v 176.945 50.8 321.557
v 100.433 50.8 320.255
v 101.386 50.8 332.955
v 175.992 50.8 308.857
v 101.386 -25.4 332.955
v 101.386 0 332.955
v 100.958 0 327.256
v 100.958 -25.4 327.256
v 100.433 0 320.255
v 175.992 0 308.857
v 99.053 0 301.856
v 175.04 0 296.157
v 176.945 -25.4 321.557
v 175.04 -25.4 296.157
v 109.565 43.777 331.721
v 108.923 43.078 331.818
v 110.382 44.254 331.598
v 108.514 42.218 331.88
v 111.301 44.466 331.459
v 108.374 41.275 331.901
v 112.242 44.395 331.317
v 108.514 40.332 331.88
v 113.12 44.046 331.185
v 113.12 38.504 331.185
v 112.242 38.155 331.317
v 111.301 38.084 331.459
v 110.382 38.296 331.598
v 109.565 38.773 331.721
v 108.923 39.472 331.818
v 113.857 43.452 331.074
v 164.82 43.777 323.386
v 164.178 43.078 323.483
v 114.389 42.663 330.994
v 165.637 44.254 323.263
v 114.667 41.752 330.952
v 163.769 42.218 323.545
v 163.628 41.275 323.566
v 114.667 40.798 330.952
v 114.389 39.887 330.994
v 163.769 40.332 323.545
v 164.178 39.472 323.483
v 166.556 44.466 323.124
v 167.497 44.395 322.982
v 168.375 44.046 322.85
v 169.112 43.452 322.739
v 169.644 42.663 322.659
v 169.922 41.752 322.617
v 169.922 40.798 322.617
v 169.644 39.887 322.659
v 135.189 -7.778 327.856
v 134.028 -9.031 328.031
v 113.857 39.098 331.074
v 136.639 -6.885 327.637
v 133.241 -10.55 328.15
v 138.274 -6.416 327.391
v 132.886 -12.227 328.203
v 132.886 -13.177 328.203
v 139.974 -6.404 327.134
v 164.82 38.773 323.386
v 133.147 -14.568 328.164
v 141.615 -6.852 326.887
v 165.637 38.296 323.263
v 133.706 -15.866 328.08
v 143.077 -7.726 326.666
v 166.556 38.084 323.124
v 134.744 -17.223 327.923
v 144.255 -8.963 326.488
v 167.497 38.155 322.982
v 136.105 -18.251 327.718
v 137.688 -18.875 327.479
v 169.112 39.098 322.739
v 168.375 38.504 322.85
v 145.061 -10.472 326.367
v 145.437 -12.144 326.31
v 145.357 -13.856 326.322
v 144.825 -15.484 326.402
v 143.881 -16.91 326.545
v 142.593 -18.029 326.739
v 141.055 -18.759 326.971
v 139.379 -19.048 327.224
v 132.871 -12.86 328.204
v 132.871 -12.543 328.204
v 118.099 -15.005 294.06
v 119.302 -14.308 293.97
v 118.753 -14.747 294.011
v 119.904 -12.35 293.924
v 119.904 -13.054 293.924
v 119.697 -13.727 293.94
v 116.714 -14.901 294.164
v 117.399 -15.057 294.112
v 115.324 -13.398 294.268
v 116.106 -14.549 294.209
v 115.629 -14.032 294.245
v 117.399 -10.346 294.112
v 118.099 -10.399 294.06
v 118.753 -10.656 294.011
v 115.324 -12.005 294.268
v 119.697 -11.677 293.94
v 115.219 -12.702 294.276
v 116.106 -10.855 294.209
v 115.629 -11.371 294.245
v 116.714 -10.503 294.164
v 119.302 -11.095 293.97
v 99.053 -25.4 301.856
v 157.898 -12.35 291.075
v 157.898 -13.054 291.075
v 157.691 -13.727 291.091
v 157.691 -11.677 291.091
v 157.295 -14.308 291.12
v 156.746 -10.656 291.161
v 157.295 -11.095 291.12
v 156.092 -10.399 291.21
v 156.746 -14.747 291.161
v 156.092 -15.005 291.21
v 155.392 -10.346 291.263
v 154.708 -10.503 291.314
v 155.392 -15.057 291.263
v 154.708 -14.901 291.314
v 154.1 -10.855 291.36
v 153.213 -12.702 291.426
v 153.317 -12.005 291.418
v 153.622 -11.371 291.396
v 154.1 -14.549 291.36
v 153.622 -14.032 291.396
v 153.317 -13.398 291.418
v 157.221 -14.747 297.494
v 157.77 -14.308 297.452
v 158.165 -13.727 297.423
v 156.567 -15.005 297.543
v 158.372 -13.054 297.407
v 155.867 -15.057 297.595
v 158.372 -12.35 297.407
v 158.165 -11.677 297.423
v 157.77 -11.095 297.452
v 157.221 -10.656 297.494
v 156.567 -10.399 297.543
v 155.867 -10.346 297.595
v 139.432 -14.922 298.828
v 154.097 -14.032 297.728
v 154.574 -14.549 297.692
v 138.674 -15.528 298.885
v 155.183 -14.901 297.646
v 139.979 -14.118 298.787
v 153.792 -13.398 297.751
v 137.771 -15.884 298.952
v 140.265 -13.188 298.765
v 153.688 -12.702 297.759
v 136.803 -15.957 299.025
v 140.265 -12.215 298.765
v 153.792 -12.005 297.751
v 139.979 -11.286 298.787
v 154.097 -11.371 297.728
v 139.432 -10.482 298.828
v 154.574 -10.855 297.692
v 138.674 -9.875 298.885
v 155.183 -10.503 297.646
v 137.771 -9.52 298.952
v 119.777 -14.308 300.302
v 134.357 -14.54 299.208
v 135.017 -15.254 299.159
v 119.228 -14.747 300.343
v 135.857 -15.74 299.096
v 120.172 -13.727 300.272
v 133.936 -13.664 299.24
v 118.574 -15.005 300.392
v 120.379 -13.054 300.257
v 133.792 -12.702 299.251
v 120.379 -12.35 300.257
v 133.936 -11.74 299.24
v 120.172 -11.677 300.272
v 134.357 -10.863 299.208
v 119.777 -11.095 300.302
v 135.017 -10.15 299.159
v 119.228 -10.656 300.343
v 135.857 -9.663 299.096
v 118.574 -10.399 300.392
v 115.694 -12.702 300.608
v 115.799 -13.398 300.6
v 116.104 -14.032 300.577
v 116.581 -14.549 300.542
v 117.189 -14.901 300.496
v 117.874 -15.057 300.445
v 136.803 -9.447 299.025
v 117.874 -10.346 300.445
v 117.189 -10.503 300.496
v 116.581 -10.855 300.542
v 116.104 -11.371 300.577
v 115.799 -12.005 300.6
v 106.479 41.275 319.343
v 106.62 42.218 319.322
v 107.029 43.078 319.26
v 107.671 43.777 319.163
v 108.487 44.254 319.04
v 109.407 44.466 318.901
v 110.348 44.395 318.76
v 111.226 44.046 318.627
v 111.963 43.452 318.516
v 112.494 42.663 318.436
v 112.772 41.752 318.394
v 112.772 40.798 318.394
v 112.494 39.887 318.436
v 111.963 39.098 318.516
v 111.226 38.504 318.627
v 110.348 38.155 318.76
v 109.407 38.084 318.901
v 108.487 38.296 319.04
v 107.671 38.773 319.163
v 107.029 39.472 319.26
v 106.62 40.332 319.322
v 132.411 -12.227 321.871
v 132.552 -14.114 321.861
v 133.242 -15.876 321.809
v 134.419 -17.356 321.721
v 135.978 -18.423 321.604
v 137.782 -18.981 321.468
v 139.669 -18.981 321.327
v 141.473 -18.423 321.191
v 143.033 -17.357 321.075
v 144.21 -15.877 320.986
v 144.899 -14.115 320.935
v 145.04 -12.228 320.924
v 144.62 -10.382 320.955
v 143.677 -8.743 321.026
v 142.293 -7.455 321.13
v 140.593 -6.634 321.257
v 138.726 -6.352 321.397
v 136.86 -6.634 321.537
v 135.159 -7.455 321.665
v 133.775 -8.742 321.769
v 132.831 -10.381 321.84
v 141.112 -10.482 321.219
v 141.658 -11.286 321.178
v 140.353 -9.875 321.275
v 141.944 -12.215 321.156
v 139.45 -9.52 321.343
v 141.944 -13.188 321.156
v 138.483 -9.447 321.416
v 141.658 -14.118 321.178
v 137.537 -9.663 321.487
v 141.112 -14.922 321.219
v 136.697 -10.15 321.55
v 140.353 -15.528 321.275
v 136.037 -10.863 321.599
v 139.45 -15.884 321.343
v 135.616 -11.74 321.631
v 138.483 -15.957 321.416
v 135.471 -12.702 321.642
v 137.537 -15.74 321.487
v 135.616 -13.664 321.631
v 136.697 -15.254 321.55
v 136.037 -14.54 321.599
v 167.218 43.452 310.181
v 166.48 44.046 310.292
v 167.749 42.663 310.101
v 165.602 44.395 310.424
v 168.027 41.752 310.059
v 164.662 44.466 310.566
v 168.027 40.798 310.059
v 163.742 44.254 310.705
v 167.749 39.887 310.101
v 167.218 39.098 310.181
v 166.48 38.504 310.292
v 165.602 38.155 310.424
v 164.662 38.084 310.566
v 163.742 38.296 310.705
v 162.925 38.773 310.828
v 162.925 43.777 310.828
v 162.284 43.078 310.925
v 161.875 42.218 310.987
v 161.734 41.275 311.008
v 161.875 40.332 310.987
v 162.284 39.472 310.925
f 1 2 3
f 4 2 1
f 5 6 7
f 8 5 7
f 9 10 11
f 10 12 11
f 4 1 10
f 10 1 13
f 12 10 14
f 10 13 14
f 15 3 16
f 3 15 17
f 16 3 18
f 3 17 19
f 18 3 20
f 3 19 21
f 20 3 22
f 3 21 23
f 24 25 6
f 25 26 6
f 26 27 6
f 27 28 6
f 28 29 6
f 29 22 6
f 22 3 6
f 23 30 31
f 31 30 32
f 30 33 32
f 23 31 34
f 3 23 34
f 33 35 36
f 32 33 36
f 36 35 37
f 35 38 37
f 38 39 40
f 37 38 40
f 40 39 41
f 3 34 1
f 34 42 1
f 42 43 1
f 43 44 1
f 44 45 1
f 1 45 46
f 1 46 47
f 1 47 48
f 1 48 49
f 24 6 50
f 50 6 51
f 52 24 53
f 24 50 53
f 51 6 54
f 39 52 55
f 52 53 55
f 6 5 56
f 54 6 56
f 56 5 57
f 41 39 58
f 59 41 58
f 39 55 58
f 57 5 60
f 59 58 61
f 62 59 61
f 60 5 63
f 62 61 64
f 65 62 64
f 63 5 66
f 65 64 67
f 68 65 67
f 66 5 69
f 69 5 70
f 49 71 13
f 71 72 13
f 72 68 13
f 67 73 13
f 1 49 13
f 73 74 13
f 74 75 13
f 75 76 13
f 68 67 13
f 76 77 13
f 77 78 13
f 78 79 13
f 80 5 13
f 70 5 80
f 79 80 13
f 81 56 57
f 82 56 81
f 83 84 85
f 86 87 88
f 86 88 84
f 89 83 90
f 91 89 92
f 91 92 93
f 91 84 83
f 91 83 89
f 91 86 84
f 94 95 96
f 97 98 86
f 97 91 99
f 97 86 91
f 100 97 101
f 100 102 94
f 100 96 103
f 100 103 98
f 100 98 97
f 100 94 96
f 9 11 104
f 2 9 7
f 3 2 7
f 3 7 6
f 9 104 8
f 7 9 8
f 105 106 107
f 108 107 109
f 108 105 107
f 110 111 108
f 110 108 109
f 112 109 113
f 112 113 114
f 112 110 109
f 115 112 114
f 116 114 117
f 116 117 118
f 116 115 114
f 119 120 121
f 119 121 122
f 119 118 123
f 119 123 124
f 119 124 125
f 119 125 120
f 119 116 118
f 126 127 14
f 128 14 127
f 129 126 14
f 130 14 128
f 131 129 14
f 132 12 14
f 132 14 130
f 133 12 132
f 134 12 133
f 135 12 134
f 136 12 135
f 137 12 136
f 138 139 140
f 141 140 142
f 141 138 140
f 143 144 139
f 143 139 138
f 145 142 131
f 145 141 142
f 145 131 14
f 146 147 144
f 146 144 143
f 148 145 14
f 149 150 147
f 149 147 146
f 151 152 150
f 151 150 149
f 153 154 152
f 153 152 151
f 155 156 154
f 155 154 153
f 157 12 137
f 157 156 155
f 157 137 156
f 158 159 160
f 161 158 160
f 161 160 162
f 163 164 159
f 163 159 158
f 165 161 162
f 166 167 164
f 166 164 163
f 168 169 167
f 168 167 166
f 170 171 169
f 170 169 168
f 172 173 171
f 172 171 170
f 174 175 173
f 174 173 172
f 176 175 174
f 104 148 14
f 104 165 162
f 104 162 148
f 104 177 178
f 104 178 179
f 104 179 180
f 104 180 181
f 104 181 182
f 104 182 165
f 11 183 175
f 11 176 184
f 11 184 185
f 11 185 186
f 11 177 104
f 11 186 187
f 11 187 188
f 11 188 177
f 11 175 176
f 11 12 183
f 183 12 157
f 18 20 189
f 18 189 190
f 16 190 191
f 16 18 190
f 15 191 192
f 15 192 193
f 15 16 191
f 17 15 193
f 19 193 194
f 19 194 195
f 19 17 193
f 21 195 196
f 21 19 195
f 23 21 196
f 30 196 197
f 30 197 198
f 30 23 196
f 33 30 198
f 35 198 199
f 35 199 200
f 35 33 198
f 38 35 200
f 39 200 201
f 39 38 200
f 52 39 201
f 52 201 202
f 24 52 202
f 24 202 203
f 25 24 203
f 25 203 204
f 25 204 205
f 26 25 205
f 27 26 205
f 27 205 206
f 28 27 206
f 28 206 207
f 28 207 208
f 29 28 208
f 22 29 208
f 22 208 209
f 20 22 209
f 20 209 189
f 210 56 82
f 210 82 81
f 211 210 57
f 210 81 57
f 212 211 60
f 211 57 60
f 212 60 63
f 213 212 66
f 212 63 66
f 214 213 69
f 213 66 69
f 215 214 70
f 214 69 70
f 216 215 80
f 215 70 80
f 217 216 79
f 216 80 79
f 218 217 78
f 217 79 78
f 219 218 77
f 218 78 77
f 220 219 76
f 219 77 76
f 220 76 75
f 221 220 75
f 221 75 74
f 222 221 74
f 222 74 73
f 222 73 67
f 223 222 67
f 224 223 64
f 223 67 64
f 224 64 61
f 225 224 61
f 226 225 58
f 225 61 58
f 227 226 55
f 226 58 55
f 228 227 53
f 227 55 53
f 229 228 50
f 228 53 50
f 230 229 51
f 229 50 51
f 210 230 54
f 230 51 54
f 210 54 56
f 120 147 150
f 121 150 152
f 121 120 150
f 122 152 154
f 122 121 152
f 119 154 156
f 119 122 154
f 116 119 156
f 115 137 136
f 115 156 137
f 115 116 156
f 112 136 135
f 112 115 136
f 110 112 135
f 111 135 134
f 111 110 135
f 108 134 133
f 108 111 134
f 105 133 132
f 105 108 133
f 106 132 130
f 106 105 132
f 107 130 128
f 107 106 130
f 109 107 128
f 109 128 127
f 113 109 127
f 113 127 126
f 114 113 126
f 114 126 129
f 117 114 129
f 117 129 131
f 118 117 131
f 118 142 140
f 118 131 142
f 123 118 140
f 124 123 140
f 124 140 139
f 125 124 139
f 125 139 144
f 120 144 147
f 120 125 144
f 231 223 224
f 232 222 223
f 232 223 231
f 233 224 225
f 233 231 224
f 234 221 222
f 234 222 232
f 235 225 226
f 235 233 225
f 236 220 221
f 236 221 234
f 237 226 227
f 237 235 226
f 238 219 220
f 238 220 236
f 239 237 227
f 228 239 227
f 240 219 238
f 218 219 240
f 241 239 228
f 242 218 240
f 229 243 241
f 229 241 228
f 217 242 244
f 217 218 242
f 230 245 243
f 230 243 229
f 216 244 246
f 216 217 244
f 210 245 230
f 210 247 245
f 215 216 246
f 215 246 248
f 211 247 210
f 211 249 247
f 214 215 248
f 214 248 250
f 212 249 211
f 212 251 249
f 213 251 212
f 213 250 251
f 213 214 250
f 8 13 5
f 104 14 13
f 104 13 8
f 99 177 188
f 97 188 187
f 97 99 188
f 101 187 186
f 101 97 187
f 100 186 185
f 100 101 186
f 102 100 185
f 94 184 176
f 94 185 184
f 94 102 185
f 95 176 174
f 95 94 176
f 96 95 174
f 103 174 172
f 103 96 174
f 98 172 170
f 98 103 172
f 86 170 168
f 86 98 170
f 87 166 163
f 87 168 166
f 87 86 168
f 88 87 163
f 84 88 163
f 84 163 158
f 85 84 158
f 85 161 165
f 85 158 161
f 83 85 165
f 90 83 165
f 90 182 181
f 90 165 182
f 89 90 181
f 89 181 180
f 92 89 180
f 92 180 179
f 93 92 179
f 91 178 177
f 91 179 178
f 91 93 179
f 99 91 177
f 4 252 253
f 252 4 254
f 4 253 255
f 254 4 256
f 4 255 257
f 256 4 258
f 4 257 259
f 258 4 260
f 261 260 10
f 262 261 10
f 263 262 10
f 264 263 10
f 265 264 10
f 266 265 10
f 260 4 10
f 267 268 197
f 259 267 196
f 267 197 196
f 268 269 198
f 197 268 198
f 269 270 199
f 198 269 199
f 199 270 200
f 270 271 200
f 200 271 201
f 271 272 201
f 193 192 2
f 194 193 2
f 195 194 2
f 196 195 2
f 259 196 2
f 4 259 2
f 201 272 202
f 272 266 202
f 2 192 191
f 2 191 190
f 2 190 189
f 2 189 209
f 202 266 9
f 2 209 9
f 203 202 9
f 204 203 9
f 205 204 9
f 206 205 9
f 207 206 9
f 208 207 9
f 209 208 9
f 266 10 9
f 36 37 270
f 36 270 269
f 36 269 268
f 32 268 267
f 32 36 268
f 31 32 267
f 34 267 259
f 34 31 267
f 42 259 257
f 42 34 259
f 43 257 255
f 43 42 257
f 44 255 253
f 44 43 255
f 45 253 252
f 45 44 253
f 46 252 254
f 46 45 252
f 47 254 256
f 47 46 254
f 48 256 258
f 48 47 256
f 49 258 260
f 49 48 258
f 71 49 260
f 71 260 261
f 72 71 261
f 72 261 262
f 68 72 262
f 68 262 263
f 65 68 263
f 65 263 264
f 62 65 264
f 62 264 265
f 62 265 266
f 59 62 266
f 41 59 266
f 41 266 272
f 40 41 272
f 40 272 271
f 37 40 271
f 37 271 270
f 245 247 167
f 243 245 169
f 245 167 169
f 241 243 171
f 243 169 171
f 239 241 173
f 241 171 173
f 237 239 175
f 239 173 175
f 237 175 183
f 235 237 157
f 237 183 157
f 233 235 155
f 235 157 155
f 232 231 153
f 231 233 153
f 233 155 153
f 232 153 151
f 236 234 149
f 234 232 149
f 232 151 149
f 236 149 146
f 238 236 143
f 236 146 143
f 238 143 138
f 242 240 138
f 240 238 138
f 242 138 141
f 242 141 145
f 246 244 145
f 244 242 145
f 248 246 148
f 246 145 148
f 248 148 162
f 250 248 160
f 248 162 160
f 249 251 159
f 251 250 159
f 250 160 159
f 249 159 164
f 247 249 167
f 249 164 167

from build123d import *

# Parameters (mm, degrees)
BOSS_EXTRUDE1_OUTLINE_W   = 76.2
BOSS_EXTRUDE1_OUTLINE_H   = 25.4
BOSS_EXTRUDE1_OUTLINE_R   = 3.2639
BOSS_EXTRUDE1_DEPTH       = 25.471337323
BOSS_EXTRUDE1_START       = -25.4
BOSS_EXTRUDE1_2_DEPTH     = 25.4
BOSS_EXTRUDE1_START_2     = 333.890252769
BOSS_EXTRUDE1_3_OUTLINE_R = 3.2639
BOSS_EXTRUDE1_3_DEPTH     = 5.715
BOSS_EXTRUDE2_START       = 302.068915446
BOSS_EXTRUDE2_OUTLINE_R   = 2.3622
BOSS_EXTRUDE2_DEPTH       = 6.931084554
BOSS_EXTRUDE3_DEPTH       = 50.8
SKETCH6_R                 = 3.19999995
CUT_EXTRUDE1_DEPTH        = 120.033223303
SKETCH8_R                 = 6.35
CUT_EXTRUDE2_DEPTH        = 6.35


with BuildPart() as part:
    # Boss-Extrude1: read off the stored shape, not the designer's step
    # Boss-Extrude1 outline → Boss-Extrude1 (new body)
    with BuildSketch(Plane(origin=(23.066634723, 0, 307.55512964), x_dir=(0.9971993098884564, 0, -0.07478994824163422), z_dir=(0.07478994824163422, 0, 0.9971993098884564))):
        with Locations((38.1, -12.7)):
            Rectangle(BOSS_EXTRUDE1_OUTLINE_W, BOSS_EXTRUDE1_OUTLINE_H)
        with Locations((38.1, -12.701750828)):
            Circle(BOSS_EXTRUDE1_OUTLINE_R, mode=Mode.SUBTRACT)
    extrude(amount=BOSS_EXTRUDE1_DEPTH)

    # Boss-Extrude1 2 outline → Boss-Extrude1 2 (add)
    with BuildSketch(Plane(origin=(0, 0, 0), x_dir=(1, 0, 0), z_dir=(0, 1, 0)).offset(BOSS_EXTRUDE1_START)):
        Polygon((101.385646691, -332.95512964), (100.958222137, -327.256135584), (24.971634723, -332.95512964), align=None)
    extrude(amount=BOSS_EXTRUDE1_2_DEPTH)

    # Boss-Extrude1 3 outline → Boss-Extrude1 3 (cut)
    with BuildSketch(Plane(origin=(0, 0, 0), x_dir=(0.9971993098884564, 0, -0.07478994824163422), z_dir=(0.07478994824163422, 0, 0.9971993098884564)).offset(BOSS_EXTRUDE1_START_2)):
        with Locations((38.1, -12.701750828)):
            Circle(BOSS_EXTRUDE1_3_OUTLINE_R)
    extrude(amount=BOSS_EXTRUDE1_3_DEPTH, mode=Mode.SUBTRACT)

    # Boss-Extrude2: read off the stored shape, not the designer's step
    # Boss-Extrude2 outline → Boss-Extrude2 (add)
    with BuildSketch(Plane(origin=(0, 0, 0), x_dir=(0.9971993098884564, 0, -0.07478994824163422), z_dir=(0.07478994824163422, 0, 0.9971993098884564)).offset(BOSS_EXTRUDE2_START)):
        with Locations((57.15, -12.701750828)):
            Circle(BOSS_EXTRUDE2_OUTLINE_R)
        with Locations((19.05, -12.701750828)):
            Circle(BOSS_EXTRUDE2_OUTLINE_R)
    extrude(amount=BOSS_EXTRUDE2_DEPTH)

    # Sketch7 → Boss-Extrude3 (add)
    with BuildSketch(Plane(origin=(0, 0, 0), x_dir=(1, 0, 0), z_dir=(0, 1, 0))):
        Polygon((24.971634723, -332.95512964), (24.019134723, -320.25512964), (100.433146691, -320.25512964), (101.385646691, -332.95512964), align=None)
    extrude(amount=BOSS_EXTRUDE3_DEPTH)

    # Sketch6 → Cut-Extrude1 (cut, through all)
    with BuildSketch(Plane.XY.offset(332.95512964)):
        with Locations((35.238640707, 41.275)):
            Circle(SKETCH6_R)
        with Locations((91.118640707, 41.275)):
            Circle(SKETCH6_R)
    extrude(amount=-CUT_EXTRUDE1_DEPTH, mode=Mode.SUBTRACT)

    # Sketch8 → Cut-Extrude2 (cut)
    with BuildSketch(Plane(origin=(25.220865956, 0, 336.278212746), x_dir=(-0.9971993098884564, 0, 0.07478994824163424), z_dir=(-0.07478994824163424, 0, -0.9971993098884564))):
        with Locations(Location((-38.1, -12.701750828, 0), (0, 0, 175.710846671))):
            Circle(SKETCH8_R)
    extrude(amount=CUT_EXTRUDE2_DEPTH, mode=Mode.SUBTRACT)


with BuildPart() as body_2:
    # Mirror1: mirrored copy
    add(part.part.mirror(Plane(origin=(107.187637483, 0, 410.315006871), x_dir=(0.07478994824163424, 0, 0.9971993098884564), z_dir=(-0.9971993098884564, 1.0351948349208248e-14, 0.07478994824163424))))


solid = body_2.part
